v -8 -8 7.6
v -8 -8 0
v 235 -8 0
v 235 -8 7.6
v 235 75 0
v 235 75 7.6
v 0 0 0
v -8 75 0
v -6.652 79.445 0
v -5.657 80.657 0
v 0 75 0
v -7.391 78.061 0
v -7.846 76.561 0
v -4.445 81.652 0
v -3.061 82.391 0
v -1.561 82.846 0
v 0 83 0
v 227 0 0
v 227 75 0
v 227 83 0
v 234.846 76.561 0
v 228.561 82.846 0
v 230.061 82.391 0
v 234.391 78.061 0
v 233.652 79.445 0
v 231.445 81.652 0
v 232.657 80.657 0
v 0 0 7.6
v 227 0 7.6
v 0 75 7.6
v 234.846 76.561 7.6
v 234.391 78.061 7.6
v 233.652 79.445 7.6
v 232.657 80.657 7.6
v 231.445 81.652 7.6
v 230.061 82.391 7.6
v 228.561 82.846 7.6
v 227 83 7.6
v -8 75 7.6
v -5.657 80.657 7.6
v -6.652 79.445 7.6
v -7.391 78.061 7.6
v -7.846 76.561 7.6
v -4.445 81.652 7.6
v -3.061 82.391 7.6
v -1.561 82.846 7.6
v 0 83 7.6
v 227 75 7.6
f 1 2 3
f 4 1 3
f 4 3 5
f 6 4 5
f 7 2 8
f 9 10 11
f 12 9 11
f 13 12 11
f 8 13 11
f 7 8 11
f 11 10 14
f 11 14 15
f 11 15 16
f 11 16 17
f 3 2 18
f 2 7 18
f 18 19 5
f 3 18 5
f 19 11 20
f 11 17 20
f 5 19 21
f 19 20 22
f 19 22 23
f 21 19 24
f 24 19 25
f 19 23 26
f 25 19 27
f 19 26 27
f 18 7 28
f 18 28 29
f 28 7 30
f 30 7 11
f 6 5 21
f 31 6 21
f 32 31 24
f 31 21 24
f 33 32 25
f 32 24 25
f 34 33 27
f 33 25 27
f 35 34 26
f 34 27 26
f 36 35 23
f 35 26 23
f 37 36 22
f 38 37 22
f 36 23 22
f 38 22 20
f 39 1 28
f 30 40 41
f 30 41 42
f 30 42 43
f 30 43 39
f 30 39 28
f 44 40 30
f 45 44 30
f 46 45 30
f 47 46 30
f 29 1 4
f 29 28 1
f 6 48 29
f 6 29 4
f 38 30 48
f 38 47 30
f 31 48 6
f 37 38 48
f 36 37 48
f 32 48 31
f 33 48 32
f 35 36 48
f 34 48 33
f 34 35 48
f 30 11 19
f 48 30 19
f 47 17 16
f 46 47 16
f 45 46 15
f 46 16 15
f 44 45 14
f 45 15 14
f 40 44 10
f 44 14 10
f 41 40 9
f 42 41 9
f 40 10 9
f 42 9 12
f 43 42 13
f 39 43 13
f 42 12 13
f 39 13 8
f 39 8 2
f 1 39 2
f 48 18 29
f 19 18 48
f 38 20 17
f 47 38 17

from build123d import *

# Parameters (mm, degrees)
F0_W     = 227
F0_H     = 75
F1_DEPTH = 7.6


with BuildPart() as f1:
    # F0 (on Top) → F1 (new body)
    with BuildSketch(Plane.XY):
        with BuildLine():
            Line((227, 83), (0, 83))
            ThreePointArc((0, 83), (-5.656854, 80.656854), (-8, 75))
            Line((-8, 75), (-8, 0))
            Line((-8, 0), (-8, -8))
            Line((-8, -8), (0, -8))
            Line((0, -8), (227, -8))
            Line((227, -8), (235, -8))
            Line((235, -8), (235, 0))
            Line((235, 0), (235, 75))
            ThreePointArc((235, 75), (232.656854, 80.656854), (227, 83))
        make_face()
        with Locations((113.5, 37.5)):
            Rectangle(F0_W, F0_H, mode=Mode.SUBTRACT)
    extrude(amount=F1_DEPTH)


solid = f1.part
